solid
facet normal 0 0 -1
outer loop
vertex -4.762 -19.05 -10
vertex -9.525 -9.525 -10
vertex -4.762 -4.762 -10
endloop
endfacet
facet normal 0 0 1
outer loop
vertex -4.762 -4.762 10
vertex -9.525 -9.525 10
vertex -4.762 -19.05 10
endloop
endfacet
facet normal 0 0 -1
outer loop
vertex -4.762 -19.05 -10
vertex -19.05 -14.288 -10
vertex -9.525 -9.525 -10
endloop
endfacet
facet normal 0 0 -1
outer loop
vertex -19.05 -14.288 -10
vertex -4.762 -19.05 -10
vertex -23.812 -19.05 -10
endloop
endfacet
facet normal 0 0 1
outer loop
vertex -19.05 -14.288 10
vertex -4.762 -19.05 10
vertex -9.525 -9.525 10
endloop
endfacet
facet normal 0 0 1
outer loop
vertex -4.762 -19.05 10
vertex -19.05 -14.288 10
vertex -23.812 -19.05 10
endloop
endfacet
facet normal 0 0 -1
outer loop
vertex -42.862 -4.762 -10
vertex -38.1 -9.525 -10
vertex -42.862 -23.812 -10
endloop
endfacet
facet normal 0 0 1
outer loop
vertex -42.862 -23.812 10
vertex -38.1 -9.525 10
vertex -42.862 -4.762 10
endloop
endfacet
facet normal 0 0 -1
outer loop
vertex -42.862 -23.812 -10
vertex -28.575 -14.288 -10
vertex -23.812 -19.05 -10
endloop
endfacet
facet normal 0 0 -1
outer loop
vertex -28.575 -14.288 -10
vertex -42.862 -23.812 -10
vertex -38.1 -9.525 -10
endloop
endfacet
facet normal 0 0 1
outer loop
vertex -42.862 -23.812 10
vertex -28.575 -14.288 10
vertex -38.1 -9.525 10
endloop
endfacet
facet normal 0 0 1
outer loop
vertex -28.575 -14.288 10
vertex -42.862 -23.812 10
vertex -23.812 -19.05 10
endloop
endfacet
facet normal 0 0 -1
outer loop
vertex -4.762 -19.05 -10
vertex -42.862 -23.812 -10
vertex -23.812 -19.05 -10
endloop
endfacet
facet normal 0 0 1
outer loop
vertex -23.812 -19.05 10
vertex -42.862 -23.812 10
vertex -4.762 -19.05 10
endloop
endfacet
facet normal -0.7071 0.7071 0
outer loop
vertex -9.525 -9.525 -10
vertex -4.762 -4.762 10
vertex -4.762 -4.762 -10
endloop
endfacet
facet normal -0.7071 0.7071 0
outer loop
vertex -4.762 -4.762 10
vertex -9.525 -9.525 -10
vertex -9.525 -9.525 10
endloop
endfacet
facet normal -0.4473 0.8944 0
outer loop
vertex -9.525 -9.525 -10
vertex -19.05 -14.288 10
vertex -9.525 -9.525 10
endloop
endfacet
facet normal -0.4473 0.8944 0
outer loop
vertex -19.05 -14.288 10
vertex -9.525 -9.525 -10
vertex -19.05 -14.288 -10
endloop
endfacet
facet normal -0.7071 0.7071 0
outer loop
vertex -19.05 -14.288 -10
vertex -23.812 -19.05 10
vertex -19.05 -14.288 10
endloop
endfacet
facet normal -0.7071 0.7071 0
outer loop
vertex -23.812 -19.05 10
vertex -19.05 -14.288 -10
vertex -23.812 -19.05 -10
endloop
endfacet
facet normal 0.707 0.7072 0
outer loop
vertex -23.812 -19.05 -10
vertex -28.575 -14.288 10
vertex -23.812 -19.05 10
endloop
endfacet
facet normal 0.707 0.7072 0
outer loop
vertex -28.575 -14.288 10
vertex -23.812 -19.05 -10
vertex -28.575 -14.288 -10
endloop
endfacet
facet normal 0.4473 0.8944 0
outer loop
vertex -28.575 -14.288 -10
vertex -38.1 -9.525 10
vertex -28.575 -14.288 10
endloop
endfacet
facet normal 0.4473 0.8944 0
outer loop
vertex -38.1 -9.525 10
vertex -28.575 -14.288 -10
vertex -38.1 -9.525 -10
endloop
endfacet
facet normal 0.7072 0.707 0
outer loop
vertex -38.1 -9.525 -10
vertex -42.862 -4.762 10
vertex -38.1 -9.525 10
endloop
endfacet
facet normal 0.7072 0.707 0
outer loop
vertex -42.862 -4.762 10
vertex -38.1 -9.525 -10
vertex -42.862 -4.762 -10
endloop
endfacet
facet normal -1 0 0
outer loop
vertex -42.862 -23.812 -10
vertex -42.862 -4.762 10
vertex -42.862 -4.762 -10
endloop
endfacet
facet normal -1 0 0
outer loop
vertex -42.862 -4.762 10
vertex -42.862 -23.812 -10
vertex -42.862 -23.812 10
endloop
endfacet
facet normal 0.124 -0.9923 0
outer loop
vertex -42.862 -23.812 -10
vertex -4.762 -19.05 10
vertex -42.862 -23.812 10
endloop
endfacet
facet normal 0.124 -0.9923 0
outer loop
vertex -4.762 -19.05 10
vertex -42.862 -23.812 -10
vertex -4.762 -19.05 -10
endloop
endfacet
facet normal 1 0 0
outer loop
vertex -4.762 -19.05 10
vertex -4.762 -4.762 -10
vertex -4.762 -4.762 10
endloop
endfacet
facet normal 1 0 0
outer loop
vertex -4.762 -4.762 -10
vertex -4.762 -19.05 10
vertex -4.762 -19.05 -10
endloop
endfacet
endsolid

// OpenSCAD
polyhedron(
    points=[
    [-4.7625, -4.7625, -10],
    [-9.525, -9.525, -10],
    [-19.05, -14.2875, -10],
    [-23.8125, -19.05, -10],
    [-28.575, -14.2875, -10],
    [-38.1, -9.525, -10],
    [-42.8625, -4.7625, -10],
    [-42.8625, -23.8125, -10],
    [-4.7625, -19.05, -10],
    [-4.7625, -4.7625, 10],
    [-9.525, -9.525, 10],
    [-19.05, -14.2875, 10],
    [-23.8125, -19.05, 10],
    [-28.575, -14.2875, 10],
    [-38.1, -9.525, 10],
    [-42.8625, -4.7625, 10],
    [-42.8625, -23.8125, 10],
    [-4.7625, -19.05, 10],
    ],
    faces=[
        [0,1,8],
        [17,10,9],
        [1,2,3,8],
        [17,12,11,10],
        [7,5,6],
        [15,14,16],
        [7,3,4,5],
        [14,13,12,16],
        [3,7,8],
        [17,16,12],
        [0,9,10,1],
        [1,10,11,2],
        [2,11,12,3],
        [3,12,13,4],
        [4,13,14,5],
        [5,14,15,6],
        [6,15,16,7],
        [7,16,17,8],
        [8,17,9,0],
    ]
);
